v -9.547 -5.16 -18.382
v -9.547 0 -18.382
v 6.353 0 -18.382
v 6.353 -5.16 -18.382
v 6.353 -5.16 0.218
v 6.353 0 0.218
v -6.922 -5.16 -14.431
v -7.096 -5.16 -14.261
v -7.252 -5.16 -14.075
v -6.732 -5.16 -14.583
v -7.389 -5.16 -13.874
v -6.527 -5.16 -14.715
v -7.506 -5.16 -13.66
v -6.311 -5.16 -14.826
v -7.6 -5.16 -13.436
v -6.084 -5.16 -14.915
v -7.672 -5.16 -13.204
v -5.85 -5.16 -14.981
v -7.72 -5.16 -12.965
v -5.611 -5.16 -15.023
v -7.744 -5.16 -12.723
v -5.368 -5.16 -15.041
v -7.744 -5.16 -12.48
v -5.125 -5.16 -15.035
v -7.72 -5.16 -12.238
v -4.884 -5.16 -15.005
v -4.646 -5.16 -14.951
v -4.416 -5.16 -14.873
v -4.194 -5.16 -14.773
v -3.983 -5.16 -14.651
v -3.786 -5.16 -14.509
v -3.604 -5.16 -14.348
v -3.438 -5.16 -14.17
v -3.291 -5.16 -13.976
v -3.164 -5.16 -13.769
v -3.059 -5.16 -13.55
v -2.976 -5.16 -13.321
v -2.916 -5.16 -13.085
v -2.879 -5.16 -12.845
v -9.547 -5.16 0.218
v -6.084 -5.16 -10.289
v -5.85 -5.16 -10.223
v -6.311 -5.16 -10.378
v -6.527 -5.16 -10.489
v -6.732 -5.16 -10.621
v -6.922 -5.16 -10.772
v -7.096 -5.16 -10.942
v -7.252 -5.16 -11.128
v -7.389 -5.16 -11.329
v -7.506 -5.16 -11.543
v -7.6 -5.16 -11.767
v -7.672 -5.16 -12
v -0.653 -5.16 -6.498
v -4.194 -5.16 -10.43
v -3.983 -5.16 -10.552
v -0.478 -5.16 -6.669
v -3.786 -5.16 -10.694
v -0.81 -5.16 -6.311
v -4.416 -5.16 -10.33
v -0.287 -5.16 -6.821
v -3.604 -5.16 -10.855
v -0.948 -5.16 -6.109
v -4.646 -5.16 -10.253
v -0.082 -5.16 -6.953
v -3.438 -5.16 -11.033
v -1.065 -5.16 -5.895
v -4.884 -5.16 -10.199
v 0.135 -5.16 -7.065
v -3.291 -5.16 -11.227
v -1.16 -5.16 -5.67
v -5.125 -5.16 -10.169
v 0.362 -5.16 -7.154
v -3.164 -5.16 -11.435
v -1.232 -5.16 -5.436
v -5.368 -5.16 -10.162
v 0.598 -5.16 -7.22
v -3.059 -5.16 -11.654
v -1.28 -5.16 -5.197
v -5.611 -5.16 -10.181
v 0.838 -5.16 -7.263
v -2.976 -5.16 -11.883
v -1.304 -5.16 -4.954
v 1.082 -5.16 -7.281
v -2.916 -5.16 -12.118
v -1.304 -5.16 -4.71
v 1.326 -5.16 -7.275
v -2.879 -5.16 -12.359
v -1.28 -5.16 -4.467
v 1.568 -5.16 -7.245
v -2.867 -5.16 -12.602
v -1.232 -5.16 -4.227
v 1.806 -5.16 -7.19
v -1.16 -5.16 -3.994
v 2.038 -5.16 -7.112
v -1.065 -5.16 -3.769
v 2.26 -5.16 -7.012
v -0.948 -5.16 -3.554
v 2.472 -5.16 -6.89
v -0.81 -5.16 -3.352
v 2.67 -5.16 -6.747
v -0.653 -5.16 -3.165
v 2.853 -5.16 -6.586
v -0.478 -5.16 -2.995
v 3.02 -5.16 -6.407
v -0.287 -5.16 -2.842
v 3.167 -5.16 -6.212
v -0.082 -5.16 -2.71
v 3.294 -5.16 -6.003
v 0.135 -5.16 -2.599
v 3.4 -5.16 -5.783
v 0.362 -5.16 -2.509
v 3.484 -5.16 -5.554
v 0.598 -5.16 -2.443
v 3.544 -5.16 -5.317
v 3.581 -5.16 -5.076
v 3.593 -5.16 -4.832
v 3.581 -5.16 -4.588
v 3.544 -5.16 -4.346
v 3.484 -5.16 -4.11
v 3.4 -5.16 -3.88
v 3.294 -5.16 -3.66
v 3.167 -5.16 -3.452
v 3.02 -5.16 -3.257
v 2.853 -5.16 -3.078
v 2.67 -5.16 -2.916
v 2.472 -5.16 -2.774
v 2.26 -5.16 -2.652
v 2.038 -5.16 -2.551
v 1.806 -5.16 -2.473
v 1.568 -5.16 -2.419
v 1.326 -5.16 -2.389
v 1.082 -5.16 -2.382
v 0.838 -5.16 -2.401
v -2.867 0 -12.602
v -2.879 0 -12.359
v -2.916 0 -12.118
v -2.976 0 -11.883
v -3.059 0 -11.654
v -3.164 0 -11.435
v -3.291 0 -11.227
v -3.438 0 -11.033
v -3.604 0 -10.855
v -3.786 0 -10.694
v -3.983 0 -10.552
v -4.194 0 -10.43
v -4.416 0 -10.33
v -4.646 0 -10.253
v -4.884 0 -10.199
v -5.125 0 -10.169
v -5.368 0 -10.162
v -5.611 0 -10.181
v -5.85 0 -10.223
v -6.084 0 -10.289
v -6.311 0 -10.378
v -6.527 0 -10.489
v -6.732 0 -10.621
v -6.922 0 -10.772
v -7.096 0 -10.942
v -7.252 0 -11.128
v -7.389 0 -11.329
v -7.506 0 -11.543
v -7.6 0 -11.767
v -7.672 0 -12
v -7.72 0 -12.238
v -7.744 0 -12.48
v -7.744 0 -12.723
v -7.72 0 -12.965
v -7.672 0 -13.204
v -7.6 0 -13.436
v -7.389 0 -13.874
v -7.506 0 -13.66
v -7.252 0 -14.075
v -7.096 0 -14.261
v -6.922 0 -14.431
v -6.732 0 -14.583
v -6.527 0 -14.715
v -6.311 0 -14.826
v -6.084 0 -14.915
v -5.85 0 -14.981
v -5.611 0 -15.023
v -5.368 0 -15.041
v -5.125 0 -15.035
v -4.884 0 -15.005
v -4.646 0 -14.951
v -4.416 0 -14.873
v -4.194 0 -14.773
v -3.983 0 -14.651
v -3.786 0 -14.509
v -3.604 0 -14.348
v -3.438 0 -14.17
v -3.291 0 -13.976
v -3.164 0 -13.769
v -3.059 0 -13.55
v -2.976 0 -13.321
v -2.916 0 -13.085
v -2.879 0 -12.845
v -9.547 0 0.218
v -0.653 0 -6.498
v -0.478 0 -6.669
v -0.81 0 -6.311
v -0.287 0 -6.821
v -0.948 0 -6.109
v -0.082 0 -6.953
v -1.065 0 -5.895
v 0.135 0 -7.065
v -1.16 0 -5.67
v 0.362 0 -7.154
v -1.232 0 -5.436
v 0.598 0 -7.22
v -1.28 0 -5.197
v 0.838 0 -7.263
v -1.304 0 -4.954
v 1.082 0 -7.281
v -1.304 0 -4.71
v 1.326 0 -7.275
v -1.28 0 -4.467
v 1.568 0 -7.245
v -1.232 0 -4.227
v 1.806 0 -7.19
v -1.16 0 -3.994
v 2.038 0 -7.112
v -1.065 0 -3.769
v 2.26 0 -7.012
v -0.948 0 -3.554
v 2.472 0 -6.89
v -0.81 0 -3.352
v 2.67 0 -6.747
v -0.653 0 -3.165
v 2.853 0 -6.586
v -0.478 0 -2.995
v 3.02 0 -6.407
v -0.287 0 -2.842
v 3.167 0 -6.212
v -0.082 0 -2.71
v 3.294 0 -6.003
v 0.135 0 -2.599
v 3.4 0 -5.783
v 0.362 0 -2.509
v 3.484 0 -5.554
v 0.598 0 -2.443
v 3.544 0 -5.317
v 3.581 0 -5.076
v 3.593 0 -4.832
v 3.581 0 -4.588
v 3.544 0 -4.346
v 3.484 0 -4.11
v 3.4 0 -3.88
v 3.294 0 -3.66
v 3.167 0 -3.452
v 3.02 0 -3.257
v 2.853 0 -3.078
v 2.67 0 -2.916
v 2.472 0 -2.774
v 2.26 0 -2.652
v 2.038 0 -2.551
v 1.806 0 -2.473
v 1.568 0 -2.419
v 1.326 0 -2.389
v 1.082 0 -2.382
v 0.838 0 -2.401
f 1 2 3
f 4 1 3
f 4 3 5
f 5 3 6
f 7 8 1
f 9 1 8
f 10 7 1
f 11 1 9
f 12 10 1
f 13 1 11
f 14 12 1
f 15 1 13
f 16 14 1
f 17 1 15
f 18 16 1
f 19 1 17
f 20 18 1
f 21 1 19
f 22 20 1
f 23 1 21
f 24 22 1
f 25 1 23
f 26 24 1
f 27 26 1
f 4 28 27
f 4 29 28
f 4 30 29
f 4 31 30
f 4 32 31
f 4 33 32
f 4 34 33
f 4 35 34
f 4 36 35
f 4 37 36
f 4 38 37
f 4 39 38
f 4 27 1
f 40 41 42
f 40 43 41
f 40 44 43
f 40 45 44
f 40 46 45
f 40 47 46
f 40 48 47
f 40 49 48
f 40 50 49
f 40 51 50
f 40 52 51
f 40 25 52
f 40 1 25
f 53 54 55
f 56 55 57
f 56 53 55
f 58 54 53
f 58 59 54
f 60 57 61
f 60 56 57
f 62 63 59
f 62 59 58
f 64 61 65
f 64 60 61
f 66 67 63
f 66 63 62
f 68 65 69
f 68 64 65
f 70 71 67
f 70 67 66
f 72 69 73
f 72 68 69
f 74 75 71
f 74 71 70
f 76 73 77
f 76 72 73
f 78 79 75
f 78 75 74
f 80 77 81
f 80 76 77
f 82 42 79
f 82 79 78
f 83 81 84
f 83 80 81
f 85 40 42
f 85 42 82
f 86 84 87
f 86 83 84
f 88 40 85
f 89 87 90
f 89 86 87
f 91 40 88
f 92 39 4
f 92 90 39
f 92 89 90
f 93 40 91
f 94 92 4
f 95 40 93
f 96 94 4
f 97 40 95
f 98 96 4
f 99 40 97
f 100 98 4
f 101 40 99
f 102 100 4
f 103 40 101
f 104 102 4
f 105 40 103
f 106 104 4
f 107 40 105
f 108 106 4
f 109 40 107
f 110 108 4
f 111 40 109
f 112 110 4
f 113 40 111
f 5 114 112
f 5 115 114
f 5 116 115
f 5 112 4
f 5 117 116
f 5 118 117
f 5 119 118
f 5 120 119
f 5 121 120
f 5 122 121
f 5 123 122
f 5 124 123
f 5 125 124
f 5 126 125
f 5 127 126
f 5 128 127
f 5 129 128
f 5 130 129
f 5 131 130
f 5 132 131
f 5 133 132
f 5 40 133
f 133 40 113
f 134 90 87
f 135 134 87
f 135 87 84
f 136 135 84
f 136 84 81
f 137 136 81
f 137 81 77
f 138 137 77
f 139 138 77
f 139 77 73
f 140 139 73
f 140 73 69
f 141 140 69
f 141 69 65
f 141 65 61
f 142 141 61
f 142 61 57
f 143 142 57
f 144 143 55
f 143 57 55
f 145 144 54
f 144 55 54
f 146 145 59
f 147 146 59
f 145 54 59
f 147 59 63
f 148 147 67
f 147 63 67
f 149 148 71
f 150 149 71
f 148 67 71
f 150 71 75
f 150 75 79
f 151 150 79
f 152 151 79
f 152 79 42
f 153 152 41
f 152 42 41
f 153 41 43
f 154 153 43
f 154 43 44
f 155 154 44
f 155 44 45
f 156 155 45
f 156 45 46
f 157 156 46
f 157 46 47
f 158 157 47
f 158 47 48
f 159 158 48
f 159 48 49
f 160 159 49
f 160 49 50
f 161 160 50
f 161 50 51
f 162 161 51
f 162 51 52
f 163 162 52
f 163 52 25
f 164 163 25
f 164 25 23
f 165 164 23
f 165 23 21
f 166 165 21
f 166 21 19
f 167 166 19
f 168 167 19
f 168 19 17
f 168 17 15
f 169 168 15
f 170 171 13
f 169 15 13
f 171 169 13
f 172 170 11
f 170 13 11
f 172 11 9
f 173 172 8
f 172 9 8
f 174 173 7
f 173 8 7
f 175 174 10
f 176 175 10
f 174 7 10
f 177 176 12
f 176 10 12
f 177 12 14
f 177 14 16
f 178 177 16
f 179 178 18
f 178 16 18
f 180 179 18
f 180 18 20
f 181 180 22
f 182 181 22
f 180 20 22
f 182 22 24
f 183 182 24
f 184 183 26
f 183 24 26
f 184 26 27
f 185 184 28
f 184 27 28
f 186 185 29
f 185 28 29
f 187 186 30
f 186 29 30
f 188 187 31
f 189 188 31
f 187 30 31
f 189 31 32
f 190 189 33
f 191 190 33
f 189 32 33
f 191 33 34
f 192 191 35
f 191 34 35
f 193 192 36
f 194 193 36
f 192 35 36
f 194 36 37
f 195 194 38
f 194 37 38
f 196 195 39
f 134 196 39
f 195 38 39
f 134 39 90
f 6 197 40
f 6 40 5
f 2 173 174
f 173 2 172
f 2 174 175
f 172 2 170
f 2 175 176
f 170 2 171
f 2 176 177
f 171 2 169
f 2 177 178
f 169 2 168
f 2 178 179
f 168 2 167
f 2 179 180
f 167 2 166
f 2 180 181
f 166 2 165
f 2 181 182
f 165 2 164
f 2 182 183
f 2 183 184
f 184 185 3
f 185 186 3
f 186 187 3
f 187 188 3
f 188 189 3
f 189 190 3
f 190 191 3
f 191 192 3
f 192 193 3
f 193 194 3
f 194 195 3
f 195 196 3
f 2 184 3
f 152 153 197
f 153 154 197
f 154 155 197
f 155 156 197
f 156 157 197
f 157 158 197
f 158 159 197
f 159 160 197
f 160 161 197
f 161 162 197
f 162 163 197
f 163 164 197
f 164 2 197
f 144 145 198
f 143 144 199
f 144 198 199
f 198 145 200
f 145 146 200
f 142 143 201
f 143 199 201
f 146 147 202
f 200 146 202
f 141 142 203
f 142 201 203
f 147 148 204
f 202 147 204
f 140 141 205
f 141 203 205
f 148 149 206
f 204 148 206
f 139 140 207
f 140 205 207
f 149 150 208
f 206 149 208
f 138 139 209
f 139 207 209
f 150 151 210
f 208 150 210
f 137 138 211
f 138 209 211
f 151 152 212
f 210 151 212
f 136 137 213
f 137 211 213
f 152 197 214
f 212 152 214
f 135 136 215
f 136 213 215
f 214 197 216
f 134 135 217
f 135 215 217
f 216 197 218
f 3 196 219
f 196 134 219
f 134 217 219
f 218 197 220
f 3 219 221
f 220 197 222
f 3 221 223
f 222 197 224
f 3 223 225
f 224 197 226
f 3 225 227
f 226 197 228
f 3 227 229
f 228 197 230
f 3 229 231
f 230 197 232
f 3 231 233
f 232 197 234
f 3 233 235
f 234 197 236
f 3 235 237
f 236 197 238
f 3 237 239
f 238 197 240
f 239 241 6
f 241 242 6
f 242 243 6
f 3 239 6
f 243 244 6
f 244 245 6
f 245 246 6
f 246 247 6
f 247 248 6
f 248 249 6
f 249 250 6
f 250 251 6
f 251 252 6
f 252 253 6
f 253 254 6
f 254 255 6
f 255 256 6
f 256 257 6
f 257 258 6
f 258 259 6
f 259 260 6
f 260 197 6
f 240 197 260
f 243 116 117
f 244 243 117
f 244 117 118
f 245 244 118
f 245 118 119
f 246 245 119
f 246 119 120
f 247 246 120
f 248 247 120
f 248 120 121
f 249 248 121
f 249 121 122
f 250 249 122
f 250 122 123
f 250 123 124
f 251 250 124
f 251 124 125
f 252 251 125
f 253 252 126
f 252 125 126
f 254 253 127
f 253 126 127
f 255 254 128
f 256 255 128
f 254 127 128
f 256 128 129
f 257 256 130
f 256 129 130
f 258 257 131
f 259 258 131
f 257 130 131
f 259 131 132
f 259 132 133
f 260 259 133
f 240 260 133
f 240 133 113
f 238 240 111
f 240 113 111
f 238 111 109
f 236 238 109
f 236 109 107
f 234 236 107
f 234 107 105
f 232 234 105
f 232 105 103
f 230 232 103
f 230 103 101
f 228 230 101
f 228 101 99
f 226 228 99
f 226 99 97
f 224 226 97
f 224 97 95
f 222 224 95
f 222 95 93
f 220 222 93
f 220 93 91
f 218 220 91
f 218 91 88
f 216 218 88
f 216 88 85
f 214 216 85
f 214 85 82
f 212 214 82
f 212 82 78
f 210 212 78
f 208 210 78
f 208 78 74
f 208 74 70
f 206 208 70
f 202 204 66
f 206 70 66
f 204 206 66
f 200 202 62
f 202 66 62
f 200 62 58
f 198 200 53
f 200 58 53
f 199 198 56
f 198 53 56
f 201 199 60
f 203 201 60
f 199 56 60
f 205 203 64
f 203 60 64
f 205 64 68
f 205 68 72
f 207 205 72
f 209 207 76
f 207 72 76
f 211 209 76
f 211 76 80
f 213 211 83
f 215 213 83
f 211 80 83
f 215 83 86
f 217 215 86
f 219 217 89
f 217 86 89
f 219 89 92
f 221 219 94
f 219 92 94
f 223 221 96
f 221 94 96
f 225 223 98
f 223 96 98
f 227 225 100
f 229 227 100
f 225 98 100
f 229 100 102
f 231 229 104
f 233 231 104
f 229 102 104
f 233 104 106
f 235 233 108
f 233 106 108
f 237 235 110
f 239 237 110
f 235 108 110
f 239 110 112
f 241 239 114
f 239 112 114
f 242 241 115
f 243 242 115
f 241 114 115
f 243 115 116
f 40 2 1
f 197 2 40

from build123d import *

# Parameters (mm, degrees)
F0_W     = 15.9
F0_H     = 18.6
F1_DEPTH = 5.16
F2_R     = 2.45
F3_DEPTH = 5.161
F4_R     = 2.44
F5_DEPTH = 5.161


with BuildPart() as f1:
    # F0 (on Front) → F1 (new body)
    with BuildSketch(Plane.XZ):
        with Locations((-1.597295, -9.081725)):
            Rectangle(F0_W, F0_H)
    extrude(amount=F1_DEPTH)

    # F2 (on face) → F3 (cut, through all)
    with BuildSketch(Plane.XZ.offset(5.16)):
        with Locations((1.142705, -4.831725)):
            Circle(F2_R)
    extrude(amount=-F3_DEPTH, mode=Mode.SUBTRACT)

    # F4 (on face) → F5 (cut, through all)
    with BuildSketch(Plane.XZ.offset(5.16)):
        with Locations((-5.307295, -12.601725)):
            Circle(F4_R)
    extrude(amount=-F5_DEPTH, mode=Mode.SUBTRACT)


solid = f1.part
